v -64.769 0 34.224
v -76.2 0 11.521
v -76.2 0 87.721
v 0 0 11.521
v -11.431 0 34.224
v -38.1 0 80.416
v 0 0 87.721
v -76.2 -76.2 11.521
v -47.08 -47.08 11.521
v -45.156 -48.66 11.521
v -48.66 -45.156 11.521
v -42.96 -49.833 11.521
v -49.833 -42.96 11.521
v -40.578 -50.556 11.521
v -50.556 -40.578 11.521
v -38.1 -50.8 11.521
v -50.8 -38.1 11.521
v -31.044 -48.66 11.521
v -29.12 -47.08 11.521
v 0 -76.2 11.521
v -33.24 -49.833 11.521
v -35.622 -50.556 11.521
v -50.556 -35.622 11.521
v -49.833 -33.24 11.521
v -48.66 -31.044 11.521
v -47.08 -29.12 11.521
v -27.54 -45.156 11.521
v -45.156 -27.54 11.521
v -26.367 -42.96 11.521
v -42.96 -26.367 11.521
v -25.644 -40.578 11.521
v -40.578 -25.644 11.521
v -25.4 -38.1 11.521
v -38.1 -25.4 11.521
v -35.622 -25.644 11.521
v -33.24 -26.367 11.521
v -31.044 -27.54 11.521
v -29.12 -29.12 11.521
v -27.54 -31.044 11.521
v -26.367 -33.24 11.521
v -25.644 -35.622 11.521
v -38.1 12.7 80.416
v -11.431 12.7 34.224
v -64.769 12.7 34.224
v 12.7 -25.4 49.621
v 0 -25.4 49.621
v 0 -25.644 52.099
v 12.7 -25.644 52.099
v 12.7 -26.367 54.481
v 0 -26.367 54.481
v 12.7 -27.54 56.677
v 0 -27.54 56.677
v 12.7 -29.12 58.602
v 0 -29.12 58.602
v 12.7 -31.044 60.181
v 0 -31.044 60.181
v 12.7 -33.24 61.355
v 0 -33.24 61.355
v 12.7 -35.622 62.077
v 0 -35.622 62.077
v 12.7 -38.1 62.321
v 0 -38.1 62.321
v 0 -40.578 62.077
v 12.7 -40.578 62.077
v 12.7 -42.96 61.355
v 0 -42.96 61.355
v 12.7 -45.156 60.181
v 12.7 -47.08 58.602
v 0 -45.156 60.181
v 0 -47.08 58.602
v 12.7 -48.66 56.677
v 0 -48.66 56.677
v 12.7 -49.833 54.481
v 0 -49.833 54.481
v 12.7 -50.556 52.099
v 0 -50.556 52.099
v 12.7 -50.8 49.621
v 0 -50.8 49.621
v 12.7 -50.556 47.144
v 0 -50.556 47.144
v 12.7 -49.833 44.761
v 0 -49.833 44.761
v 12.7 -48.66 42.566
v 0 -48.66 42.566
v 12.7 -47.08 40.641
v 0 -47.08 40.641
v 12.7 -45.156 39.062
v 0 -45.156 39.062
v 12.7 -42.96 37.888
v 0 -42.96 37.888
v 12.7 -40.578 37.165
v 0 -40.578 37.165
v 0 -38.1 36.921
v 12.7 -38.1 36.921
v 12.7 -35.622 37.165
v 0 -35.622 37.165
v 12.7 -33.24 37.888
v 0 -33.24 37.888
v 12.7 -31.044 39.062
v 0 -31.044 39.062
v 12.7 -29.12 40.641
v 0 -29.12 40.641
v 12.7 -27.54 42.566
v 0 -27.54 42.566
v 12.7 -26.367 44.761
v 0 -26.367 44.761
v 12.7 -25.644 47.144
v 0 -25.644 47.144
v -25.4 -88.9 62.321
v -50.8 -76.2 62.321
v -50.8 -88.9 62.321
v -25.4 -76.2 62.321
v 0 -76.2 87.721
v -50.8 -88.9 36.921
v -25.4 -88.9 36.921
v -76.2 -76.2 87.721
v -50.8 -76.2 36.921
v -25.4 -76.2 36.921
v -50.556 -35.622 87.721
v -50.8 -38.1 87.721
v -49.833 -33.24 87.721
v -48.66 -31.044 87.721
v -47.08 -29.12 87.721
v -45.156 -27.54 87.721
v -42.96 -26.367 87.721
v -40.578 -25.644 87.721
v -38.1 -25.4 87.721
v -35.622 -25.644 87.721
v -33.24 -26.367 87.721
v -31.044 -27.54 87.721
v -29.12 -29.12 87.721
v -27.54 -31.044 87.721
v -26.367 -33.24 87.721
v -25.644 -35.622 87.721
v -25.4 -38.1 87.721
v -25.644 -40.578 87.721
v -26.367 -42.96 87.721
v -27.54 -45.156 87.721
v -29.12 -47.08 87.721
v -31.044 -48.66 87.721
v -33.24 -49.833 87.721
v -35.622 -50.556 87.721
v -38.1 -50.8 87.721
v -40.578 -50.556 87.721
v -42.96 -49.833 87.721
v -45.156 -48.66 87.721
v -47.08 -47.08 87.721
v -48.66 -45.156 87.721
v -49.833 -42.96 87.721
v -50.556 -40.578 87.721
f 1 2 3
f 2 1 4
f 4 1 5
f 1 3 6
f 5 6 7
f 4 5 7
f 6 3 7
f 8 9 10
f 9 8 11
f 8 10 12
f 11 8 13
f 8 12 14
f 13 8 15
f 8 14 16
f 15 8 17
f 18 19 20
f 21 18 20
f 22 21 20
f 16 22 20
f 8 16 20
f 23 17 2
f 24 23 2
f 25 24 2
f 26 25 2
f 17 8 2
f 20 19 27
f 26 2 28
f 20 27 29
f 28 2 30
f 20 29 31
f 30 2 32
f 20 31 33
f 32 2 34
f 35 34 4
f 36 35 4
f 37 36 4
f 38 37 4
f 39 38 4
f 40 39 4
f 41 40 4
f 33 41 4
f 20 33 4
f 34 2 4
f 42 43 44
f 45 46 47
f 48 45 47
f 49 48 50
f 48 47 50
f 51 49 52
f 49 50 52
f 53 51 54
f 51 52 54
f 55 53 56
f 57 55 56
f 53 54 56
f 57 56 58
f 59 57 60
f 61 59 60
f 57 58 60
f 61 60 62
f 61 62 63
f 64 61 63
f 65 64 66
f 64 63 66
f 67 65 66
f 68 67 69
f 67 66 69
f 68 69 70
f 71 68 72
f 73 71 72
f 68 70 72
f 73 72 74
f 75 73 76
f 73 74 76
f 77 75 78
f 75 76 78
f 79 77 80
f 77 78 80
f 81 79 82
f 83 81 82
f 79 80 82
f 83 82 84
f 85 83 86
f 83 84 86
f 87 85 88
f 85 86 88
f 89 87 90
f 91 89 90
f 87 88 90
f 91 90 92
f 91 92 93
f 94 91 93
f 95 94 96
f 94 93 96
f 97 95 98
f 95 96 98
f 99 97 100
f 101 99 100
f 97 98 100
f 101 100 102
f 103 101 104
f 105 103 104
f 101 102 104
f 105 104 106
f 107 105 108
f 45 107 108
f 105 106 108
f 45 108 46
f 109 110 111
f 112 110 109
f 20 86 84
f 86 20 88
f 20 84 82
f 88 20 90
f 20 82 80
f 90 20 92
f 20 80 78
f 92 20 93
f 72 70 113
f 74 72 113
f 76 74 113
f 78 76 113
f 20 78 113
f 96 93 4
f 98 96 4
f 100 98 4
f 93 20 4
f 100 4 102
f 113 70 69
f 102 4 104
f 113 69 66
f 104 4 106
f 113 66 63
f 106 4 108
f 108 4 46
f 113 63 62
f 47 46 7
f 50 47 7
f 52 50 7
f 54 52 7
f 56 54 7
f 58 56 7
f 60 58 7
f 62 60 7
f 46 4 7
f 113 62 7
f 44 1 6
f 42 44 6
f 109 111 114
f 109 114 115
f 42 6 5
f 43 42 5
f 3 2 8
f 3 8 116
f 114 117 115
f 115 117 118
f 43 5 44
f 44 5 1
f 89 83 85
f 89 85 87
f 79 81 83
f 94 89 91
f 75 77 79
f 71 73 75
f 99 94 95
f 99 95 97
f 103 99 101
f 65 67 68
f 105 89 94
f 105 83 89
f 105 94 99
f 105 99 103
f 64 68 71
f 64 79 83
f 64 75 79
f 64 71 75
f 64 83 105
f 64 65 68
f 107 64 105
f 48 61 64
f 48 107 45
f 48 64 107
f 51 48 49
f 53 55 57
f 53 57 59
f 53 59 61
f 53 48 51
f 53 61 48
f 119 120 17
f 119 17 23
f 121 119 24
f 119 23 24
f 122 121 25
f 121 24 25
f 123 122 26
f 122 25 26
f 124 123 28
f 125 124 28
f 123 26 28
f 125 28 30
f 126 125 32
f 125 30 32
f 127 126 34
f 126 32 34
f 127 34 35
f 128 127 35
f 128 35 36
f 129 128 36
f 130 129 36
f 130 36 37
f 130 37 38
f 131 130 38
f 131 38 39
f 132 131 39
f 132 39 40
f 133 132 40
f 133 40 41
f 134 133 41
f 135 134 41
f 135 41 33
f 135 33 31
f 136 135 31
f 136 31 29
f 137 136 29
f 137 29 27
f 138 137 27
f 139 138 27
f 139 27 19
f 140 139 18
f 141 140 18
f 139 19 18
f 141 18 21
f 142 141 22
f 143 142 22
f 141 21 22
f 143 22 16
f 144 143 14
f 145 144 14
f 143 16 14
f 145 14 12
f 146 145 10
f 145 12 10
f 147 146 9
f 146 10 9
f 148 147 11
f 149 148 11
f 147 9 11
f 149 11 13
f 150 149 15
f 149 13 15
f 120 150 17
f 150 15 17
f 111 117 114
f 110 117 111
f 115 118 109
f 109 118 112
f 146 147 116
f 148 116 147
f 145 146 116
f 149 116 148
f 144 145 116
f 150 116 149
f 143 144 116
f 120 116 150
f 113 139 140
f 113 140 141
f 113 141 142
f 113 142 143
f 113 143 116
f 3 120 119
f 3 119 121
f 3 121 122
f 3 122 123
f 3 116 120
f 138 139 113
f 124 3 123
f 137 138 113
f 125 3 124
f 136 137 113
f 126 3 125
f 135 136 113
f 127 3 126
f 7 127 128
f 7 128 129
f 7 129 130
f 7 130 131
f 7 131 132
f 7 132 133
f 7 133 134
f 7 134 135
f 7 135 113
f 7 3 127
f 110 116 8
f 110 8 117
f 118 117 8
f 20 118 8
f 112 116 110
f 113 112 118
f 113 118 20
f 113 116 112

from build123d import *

# Parameters (mm, degrees)
F0_W     = 76.2
F0_H     = 76.2
F1_DEPTH = 76.2
F2_W     = 25.4
F2_H     = 25.4
F3_DEPTH = 12.7
F4_R     = 12.7
F5_DEPTH = 12.7
F7_D     = 25.4
F9_DEPTH = 12.7


with BuildPart() as f1:
    # F0 (on Front) → F1 (new body)
    with BuildSketch(Plane.XZ):
        with Locations((-38.1, 49.621367)):
            Rectangle(F0_W, F0_H)
    extrude(amount=F1_DEPTH)

    # F2 (on face) → F3 (join)
    with BuildSketch(Plane.XZ.offset(76.2)):
        with Locations((-38.1, 49.621367)):
            Rectangle(F2_W, F2_H)
    extrude(amount=F3_DEPTH)

    # F4 (on face) → F5 (join)
    with BuildSketch(Plane.YZ):
        with Locations((-38.1, 49.621367)):
            Circle(F4_R)
    extrude(amount=F5_DEPTH)

    # F7 (through all)
    with Locations(Plane.XY.offset(87.721367)):
        with Locations((-38.1, -38.1)):
            Hole(F7_D / 2)

    # F8 (on face) → F9 (join)
    with BuildSketch(Plane(origin=(0, 0, 0), x_dir=(-1, 0, 0), z_dir=(0, 1, 0))):
        Polygon((11.431118, 34.224081), (64.768882, 34.224081), (38.1, 80.415939), align=None)
    extrude(amount=F9_DEPTH)


solid = f1.part
